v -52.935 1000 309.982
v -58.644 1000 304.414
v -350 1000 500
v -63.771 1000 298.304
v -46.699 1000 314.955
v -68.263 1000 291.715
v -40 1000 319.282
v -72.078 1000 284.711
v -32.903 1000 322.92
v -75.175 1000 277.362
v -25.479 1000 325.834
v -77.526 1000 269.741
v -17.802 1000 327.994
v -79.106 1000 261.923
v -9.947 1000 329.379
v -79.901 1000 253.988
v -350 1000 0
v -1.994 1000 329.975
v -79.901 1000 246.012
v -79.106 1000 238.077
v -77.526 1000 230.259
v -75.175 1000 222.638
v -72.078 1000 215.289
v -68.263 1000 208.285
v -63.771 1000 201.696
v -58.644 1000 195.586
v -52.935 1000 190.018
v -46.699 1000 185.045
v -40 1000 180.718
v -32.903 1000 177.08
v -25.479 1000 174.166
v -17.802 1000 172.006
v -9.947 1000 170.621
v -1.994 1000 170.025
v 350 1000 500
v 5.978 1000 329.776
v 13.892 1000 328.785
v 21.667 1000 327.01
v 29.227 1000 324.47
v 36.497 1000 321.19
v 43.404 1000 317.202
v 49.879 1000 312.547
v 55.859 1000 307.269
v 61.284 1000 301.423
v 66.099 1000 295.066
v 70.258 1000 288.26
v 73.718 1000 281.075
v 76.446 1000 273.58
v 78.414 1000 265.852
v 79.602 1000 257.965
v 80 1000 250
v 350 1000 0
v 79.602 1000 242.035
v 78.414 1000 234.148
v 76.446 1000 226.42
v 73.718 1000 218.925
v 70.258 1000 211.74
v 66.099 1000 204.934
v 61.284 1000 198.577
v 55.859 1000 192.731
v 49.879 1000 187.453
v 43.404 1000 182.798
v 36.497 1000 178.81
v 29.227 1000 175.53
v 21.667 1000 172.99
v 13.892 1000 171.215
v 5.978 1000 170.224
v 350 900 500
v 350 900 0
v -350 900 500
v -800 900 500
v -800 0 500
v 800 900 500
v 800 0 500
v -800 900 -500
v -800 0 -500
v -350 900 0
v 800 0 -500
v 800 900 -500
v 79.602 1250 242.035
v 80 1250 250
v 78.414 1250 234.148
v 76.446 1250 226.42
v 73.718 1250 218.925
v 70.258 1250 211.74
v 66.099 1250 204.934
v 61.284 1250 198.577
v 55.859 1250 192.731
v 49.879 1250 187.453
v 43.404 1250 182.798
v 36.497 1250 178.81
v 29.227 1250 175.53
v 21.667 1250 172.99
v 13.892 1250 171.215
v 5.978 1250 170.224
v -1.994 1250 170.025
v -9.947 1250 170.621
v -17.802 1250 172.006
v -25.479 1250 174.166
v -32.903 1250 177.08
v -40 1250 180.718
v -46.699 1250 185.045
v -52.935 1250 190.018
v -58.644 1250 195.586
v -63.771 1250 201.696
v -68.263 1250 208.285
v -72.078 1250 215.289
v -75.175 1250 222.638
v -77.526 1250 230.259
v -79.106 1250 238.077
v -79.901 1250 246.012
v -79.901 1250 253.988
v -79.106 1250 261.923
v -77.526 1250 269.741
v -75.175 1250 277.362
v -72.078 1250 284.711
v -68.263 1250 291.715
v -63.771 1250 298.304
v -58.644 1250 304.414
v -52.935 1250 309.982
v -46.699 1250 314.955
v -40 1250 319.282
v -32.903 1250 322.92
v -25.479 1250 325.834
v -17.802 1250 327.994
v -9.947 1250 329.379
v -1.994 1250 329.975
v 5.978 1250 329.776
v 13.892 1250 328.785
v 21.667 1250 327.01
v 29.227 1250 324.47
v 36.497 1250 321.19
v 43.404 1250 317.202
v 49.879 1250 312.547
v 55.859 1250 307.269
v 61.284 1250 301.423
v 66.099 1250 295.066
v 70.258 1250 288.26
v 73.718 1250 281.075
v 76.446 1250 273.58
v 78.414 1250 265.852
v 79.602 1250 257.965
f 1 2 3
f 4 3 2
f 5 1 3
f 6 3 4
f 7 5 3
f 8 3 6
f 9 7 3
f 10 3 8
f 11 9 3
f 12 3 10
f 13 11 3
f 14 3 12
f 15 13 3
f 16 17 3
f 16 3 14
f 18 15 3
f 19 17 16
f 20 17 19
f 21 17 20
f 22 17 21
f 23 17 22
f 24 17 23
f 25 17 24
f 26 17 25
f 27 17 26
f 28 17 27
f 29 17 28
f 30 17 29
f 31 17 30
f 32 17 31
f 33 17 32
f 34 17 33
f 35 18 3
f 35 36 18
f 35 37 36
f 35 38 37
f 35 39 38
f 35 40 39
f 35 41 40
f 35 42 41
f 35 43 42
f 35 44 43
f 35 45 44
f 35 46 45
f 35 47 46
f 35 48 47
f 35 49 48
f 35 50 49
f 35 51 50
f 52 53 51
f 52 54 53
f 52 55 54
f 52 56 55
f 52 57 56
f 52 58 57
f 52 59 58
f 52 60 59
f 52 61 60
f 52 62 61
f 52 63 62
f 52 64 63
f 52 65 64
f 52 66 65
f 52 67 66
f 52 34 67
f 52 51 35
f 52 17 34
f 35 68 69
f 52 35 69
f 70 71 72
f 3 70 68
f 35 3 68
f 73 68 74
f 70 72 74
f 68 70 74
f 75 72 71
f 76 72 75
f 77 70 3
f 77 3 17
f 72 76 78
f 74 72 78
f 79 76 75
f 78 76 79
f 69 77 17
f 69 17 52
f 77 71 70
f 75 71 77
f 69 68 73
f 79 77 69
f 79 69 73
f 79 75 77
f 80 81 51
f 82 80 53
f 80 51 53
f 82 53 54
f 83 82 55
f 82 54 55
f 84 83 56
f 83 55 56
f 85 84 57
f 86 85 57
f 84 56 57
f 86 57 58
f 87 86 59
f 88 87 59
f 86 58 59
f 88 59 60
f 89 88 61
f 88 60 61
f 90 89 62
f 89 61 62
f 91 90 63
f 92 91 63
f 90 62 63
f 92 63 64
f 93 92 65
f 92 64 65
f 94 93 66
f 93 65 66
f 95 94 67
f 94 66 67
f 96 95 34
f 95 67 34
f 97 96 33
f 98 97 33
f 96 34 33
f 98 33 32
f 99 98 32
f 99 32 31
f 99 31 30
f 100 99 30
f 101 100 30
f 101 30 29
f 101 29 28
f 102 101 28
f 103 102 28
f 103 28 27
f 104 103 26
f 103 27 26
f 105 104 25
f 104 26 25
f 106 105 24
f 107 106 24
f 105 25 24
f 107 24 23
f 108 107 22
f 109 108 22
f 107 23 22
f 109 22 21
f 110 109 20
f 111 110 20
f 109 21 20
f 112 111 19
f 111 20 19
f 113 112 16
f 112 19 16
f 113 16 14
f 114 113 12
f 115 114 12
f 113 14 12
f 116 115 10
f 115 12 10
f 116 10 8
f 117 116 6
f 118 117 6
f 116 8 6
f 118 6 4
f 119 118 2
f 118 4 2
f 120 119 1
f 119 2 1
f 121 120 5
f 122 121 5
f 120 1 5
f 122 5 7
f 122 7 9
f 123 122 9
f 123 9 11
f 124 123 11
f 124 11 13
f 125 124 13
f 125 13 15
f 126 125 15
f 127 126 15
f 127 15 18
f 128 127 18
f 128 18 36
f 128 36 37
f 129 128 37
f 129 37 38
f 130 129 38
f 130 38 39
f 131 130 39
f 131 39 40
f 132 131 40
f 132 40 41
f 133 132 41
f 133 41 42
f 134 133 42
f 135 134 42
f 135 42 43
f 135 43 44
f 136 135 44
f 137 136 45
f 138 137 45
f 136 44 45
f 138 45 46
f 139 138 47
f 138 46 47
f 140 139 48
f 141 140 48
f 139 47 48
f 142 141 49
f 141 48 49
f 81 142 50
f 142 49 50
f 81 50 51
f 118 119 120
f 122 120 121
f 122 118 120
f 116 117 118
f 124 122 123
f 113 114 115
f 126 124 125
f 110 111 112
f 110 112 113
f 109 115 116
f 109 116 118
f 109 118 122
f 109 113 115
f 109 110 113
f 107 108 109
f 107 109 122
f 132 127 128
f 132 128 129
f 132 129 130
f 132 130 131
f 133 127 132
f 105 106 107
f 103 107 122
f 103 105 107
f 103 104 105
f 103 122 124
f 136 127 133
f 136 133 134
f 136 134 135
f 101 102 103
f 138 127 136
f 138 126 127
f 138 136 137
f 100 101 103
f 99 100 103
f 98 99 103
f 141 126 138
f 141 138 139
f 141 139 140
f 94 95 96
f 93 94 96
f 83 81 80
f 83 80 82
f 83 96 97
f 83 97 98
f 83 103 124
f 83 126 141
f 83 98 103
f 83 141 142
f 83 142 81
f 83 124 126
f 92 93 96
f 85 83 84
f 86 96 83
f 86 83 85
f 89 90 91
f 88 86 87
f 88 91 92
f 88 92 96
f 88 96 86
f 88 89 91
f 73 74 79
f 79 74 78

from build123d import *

# Parameters (mm, degrees)
SKETCH_1_W      = 1600
SKETCH_1_H      = 1000
EXTRUDE_1_DEPTH = 900
SKETCH_2_W      = 700
SKETCH_2_H      = 500
EXTRUDE_2_DEPTH = 100
SKETCH_5_R      = 80
EXTRUDE_5_DEPTH = 250


with BuildPart() as part:
    # 草图1 → 凸台-拉伸1 (new body)
    with BuildSketch(Plane(origin=(0, 0, 0), x_dir=(1, 0, 0), z_dir=(0, 1, 0))):
        Rectangle(SKETCH_1_W, SKETCH_1_H)
    extrude(amount=EXTRUDE_1_DEPTH)

    # 草图2 → 凸台-拉伸2 (add)
    with BuildSketch(Plane(origin=(0, 900, 0), x_dir=(1, 0, 0), z_dir=(0, 1, 0))):
        with Locations((0, -250)):
            Rectangle(SKETCH_2_W, SKETCH_2_H)
    extrude(amount=EXTRUDE_2_DEPTH)

    # 草图5 → 凸台-拉伸5 (add)
    with BuildSketch(Plane(origin=(0, 1000, 0), x_dir=(1, 0, 0), z_dir=(0, 1, 0))):
        with Locations((0, -250)):
            Circle(SKETCH_5_R)
    extrude(amount=EXTRUDE_5_DEPTH)


solid = part.part
